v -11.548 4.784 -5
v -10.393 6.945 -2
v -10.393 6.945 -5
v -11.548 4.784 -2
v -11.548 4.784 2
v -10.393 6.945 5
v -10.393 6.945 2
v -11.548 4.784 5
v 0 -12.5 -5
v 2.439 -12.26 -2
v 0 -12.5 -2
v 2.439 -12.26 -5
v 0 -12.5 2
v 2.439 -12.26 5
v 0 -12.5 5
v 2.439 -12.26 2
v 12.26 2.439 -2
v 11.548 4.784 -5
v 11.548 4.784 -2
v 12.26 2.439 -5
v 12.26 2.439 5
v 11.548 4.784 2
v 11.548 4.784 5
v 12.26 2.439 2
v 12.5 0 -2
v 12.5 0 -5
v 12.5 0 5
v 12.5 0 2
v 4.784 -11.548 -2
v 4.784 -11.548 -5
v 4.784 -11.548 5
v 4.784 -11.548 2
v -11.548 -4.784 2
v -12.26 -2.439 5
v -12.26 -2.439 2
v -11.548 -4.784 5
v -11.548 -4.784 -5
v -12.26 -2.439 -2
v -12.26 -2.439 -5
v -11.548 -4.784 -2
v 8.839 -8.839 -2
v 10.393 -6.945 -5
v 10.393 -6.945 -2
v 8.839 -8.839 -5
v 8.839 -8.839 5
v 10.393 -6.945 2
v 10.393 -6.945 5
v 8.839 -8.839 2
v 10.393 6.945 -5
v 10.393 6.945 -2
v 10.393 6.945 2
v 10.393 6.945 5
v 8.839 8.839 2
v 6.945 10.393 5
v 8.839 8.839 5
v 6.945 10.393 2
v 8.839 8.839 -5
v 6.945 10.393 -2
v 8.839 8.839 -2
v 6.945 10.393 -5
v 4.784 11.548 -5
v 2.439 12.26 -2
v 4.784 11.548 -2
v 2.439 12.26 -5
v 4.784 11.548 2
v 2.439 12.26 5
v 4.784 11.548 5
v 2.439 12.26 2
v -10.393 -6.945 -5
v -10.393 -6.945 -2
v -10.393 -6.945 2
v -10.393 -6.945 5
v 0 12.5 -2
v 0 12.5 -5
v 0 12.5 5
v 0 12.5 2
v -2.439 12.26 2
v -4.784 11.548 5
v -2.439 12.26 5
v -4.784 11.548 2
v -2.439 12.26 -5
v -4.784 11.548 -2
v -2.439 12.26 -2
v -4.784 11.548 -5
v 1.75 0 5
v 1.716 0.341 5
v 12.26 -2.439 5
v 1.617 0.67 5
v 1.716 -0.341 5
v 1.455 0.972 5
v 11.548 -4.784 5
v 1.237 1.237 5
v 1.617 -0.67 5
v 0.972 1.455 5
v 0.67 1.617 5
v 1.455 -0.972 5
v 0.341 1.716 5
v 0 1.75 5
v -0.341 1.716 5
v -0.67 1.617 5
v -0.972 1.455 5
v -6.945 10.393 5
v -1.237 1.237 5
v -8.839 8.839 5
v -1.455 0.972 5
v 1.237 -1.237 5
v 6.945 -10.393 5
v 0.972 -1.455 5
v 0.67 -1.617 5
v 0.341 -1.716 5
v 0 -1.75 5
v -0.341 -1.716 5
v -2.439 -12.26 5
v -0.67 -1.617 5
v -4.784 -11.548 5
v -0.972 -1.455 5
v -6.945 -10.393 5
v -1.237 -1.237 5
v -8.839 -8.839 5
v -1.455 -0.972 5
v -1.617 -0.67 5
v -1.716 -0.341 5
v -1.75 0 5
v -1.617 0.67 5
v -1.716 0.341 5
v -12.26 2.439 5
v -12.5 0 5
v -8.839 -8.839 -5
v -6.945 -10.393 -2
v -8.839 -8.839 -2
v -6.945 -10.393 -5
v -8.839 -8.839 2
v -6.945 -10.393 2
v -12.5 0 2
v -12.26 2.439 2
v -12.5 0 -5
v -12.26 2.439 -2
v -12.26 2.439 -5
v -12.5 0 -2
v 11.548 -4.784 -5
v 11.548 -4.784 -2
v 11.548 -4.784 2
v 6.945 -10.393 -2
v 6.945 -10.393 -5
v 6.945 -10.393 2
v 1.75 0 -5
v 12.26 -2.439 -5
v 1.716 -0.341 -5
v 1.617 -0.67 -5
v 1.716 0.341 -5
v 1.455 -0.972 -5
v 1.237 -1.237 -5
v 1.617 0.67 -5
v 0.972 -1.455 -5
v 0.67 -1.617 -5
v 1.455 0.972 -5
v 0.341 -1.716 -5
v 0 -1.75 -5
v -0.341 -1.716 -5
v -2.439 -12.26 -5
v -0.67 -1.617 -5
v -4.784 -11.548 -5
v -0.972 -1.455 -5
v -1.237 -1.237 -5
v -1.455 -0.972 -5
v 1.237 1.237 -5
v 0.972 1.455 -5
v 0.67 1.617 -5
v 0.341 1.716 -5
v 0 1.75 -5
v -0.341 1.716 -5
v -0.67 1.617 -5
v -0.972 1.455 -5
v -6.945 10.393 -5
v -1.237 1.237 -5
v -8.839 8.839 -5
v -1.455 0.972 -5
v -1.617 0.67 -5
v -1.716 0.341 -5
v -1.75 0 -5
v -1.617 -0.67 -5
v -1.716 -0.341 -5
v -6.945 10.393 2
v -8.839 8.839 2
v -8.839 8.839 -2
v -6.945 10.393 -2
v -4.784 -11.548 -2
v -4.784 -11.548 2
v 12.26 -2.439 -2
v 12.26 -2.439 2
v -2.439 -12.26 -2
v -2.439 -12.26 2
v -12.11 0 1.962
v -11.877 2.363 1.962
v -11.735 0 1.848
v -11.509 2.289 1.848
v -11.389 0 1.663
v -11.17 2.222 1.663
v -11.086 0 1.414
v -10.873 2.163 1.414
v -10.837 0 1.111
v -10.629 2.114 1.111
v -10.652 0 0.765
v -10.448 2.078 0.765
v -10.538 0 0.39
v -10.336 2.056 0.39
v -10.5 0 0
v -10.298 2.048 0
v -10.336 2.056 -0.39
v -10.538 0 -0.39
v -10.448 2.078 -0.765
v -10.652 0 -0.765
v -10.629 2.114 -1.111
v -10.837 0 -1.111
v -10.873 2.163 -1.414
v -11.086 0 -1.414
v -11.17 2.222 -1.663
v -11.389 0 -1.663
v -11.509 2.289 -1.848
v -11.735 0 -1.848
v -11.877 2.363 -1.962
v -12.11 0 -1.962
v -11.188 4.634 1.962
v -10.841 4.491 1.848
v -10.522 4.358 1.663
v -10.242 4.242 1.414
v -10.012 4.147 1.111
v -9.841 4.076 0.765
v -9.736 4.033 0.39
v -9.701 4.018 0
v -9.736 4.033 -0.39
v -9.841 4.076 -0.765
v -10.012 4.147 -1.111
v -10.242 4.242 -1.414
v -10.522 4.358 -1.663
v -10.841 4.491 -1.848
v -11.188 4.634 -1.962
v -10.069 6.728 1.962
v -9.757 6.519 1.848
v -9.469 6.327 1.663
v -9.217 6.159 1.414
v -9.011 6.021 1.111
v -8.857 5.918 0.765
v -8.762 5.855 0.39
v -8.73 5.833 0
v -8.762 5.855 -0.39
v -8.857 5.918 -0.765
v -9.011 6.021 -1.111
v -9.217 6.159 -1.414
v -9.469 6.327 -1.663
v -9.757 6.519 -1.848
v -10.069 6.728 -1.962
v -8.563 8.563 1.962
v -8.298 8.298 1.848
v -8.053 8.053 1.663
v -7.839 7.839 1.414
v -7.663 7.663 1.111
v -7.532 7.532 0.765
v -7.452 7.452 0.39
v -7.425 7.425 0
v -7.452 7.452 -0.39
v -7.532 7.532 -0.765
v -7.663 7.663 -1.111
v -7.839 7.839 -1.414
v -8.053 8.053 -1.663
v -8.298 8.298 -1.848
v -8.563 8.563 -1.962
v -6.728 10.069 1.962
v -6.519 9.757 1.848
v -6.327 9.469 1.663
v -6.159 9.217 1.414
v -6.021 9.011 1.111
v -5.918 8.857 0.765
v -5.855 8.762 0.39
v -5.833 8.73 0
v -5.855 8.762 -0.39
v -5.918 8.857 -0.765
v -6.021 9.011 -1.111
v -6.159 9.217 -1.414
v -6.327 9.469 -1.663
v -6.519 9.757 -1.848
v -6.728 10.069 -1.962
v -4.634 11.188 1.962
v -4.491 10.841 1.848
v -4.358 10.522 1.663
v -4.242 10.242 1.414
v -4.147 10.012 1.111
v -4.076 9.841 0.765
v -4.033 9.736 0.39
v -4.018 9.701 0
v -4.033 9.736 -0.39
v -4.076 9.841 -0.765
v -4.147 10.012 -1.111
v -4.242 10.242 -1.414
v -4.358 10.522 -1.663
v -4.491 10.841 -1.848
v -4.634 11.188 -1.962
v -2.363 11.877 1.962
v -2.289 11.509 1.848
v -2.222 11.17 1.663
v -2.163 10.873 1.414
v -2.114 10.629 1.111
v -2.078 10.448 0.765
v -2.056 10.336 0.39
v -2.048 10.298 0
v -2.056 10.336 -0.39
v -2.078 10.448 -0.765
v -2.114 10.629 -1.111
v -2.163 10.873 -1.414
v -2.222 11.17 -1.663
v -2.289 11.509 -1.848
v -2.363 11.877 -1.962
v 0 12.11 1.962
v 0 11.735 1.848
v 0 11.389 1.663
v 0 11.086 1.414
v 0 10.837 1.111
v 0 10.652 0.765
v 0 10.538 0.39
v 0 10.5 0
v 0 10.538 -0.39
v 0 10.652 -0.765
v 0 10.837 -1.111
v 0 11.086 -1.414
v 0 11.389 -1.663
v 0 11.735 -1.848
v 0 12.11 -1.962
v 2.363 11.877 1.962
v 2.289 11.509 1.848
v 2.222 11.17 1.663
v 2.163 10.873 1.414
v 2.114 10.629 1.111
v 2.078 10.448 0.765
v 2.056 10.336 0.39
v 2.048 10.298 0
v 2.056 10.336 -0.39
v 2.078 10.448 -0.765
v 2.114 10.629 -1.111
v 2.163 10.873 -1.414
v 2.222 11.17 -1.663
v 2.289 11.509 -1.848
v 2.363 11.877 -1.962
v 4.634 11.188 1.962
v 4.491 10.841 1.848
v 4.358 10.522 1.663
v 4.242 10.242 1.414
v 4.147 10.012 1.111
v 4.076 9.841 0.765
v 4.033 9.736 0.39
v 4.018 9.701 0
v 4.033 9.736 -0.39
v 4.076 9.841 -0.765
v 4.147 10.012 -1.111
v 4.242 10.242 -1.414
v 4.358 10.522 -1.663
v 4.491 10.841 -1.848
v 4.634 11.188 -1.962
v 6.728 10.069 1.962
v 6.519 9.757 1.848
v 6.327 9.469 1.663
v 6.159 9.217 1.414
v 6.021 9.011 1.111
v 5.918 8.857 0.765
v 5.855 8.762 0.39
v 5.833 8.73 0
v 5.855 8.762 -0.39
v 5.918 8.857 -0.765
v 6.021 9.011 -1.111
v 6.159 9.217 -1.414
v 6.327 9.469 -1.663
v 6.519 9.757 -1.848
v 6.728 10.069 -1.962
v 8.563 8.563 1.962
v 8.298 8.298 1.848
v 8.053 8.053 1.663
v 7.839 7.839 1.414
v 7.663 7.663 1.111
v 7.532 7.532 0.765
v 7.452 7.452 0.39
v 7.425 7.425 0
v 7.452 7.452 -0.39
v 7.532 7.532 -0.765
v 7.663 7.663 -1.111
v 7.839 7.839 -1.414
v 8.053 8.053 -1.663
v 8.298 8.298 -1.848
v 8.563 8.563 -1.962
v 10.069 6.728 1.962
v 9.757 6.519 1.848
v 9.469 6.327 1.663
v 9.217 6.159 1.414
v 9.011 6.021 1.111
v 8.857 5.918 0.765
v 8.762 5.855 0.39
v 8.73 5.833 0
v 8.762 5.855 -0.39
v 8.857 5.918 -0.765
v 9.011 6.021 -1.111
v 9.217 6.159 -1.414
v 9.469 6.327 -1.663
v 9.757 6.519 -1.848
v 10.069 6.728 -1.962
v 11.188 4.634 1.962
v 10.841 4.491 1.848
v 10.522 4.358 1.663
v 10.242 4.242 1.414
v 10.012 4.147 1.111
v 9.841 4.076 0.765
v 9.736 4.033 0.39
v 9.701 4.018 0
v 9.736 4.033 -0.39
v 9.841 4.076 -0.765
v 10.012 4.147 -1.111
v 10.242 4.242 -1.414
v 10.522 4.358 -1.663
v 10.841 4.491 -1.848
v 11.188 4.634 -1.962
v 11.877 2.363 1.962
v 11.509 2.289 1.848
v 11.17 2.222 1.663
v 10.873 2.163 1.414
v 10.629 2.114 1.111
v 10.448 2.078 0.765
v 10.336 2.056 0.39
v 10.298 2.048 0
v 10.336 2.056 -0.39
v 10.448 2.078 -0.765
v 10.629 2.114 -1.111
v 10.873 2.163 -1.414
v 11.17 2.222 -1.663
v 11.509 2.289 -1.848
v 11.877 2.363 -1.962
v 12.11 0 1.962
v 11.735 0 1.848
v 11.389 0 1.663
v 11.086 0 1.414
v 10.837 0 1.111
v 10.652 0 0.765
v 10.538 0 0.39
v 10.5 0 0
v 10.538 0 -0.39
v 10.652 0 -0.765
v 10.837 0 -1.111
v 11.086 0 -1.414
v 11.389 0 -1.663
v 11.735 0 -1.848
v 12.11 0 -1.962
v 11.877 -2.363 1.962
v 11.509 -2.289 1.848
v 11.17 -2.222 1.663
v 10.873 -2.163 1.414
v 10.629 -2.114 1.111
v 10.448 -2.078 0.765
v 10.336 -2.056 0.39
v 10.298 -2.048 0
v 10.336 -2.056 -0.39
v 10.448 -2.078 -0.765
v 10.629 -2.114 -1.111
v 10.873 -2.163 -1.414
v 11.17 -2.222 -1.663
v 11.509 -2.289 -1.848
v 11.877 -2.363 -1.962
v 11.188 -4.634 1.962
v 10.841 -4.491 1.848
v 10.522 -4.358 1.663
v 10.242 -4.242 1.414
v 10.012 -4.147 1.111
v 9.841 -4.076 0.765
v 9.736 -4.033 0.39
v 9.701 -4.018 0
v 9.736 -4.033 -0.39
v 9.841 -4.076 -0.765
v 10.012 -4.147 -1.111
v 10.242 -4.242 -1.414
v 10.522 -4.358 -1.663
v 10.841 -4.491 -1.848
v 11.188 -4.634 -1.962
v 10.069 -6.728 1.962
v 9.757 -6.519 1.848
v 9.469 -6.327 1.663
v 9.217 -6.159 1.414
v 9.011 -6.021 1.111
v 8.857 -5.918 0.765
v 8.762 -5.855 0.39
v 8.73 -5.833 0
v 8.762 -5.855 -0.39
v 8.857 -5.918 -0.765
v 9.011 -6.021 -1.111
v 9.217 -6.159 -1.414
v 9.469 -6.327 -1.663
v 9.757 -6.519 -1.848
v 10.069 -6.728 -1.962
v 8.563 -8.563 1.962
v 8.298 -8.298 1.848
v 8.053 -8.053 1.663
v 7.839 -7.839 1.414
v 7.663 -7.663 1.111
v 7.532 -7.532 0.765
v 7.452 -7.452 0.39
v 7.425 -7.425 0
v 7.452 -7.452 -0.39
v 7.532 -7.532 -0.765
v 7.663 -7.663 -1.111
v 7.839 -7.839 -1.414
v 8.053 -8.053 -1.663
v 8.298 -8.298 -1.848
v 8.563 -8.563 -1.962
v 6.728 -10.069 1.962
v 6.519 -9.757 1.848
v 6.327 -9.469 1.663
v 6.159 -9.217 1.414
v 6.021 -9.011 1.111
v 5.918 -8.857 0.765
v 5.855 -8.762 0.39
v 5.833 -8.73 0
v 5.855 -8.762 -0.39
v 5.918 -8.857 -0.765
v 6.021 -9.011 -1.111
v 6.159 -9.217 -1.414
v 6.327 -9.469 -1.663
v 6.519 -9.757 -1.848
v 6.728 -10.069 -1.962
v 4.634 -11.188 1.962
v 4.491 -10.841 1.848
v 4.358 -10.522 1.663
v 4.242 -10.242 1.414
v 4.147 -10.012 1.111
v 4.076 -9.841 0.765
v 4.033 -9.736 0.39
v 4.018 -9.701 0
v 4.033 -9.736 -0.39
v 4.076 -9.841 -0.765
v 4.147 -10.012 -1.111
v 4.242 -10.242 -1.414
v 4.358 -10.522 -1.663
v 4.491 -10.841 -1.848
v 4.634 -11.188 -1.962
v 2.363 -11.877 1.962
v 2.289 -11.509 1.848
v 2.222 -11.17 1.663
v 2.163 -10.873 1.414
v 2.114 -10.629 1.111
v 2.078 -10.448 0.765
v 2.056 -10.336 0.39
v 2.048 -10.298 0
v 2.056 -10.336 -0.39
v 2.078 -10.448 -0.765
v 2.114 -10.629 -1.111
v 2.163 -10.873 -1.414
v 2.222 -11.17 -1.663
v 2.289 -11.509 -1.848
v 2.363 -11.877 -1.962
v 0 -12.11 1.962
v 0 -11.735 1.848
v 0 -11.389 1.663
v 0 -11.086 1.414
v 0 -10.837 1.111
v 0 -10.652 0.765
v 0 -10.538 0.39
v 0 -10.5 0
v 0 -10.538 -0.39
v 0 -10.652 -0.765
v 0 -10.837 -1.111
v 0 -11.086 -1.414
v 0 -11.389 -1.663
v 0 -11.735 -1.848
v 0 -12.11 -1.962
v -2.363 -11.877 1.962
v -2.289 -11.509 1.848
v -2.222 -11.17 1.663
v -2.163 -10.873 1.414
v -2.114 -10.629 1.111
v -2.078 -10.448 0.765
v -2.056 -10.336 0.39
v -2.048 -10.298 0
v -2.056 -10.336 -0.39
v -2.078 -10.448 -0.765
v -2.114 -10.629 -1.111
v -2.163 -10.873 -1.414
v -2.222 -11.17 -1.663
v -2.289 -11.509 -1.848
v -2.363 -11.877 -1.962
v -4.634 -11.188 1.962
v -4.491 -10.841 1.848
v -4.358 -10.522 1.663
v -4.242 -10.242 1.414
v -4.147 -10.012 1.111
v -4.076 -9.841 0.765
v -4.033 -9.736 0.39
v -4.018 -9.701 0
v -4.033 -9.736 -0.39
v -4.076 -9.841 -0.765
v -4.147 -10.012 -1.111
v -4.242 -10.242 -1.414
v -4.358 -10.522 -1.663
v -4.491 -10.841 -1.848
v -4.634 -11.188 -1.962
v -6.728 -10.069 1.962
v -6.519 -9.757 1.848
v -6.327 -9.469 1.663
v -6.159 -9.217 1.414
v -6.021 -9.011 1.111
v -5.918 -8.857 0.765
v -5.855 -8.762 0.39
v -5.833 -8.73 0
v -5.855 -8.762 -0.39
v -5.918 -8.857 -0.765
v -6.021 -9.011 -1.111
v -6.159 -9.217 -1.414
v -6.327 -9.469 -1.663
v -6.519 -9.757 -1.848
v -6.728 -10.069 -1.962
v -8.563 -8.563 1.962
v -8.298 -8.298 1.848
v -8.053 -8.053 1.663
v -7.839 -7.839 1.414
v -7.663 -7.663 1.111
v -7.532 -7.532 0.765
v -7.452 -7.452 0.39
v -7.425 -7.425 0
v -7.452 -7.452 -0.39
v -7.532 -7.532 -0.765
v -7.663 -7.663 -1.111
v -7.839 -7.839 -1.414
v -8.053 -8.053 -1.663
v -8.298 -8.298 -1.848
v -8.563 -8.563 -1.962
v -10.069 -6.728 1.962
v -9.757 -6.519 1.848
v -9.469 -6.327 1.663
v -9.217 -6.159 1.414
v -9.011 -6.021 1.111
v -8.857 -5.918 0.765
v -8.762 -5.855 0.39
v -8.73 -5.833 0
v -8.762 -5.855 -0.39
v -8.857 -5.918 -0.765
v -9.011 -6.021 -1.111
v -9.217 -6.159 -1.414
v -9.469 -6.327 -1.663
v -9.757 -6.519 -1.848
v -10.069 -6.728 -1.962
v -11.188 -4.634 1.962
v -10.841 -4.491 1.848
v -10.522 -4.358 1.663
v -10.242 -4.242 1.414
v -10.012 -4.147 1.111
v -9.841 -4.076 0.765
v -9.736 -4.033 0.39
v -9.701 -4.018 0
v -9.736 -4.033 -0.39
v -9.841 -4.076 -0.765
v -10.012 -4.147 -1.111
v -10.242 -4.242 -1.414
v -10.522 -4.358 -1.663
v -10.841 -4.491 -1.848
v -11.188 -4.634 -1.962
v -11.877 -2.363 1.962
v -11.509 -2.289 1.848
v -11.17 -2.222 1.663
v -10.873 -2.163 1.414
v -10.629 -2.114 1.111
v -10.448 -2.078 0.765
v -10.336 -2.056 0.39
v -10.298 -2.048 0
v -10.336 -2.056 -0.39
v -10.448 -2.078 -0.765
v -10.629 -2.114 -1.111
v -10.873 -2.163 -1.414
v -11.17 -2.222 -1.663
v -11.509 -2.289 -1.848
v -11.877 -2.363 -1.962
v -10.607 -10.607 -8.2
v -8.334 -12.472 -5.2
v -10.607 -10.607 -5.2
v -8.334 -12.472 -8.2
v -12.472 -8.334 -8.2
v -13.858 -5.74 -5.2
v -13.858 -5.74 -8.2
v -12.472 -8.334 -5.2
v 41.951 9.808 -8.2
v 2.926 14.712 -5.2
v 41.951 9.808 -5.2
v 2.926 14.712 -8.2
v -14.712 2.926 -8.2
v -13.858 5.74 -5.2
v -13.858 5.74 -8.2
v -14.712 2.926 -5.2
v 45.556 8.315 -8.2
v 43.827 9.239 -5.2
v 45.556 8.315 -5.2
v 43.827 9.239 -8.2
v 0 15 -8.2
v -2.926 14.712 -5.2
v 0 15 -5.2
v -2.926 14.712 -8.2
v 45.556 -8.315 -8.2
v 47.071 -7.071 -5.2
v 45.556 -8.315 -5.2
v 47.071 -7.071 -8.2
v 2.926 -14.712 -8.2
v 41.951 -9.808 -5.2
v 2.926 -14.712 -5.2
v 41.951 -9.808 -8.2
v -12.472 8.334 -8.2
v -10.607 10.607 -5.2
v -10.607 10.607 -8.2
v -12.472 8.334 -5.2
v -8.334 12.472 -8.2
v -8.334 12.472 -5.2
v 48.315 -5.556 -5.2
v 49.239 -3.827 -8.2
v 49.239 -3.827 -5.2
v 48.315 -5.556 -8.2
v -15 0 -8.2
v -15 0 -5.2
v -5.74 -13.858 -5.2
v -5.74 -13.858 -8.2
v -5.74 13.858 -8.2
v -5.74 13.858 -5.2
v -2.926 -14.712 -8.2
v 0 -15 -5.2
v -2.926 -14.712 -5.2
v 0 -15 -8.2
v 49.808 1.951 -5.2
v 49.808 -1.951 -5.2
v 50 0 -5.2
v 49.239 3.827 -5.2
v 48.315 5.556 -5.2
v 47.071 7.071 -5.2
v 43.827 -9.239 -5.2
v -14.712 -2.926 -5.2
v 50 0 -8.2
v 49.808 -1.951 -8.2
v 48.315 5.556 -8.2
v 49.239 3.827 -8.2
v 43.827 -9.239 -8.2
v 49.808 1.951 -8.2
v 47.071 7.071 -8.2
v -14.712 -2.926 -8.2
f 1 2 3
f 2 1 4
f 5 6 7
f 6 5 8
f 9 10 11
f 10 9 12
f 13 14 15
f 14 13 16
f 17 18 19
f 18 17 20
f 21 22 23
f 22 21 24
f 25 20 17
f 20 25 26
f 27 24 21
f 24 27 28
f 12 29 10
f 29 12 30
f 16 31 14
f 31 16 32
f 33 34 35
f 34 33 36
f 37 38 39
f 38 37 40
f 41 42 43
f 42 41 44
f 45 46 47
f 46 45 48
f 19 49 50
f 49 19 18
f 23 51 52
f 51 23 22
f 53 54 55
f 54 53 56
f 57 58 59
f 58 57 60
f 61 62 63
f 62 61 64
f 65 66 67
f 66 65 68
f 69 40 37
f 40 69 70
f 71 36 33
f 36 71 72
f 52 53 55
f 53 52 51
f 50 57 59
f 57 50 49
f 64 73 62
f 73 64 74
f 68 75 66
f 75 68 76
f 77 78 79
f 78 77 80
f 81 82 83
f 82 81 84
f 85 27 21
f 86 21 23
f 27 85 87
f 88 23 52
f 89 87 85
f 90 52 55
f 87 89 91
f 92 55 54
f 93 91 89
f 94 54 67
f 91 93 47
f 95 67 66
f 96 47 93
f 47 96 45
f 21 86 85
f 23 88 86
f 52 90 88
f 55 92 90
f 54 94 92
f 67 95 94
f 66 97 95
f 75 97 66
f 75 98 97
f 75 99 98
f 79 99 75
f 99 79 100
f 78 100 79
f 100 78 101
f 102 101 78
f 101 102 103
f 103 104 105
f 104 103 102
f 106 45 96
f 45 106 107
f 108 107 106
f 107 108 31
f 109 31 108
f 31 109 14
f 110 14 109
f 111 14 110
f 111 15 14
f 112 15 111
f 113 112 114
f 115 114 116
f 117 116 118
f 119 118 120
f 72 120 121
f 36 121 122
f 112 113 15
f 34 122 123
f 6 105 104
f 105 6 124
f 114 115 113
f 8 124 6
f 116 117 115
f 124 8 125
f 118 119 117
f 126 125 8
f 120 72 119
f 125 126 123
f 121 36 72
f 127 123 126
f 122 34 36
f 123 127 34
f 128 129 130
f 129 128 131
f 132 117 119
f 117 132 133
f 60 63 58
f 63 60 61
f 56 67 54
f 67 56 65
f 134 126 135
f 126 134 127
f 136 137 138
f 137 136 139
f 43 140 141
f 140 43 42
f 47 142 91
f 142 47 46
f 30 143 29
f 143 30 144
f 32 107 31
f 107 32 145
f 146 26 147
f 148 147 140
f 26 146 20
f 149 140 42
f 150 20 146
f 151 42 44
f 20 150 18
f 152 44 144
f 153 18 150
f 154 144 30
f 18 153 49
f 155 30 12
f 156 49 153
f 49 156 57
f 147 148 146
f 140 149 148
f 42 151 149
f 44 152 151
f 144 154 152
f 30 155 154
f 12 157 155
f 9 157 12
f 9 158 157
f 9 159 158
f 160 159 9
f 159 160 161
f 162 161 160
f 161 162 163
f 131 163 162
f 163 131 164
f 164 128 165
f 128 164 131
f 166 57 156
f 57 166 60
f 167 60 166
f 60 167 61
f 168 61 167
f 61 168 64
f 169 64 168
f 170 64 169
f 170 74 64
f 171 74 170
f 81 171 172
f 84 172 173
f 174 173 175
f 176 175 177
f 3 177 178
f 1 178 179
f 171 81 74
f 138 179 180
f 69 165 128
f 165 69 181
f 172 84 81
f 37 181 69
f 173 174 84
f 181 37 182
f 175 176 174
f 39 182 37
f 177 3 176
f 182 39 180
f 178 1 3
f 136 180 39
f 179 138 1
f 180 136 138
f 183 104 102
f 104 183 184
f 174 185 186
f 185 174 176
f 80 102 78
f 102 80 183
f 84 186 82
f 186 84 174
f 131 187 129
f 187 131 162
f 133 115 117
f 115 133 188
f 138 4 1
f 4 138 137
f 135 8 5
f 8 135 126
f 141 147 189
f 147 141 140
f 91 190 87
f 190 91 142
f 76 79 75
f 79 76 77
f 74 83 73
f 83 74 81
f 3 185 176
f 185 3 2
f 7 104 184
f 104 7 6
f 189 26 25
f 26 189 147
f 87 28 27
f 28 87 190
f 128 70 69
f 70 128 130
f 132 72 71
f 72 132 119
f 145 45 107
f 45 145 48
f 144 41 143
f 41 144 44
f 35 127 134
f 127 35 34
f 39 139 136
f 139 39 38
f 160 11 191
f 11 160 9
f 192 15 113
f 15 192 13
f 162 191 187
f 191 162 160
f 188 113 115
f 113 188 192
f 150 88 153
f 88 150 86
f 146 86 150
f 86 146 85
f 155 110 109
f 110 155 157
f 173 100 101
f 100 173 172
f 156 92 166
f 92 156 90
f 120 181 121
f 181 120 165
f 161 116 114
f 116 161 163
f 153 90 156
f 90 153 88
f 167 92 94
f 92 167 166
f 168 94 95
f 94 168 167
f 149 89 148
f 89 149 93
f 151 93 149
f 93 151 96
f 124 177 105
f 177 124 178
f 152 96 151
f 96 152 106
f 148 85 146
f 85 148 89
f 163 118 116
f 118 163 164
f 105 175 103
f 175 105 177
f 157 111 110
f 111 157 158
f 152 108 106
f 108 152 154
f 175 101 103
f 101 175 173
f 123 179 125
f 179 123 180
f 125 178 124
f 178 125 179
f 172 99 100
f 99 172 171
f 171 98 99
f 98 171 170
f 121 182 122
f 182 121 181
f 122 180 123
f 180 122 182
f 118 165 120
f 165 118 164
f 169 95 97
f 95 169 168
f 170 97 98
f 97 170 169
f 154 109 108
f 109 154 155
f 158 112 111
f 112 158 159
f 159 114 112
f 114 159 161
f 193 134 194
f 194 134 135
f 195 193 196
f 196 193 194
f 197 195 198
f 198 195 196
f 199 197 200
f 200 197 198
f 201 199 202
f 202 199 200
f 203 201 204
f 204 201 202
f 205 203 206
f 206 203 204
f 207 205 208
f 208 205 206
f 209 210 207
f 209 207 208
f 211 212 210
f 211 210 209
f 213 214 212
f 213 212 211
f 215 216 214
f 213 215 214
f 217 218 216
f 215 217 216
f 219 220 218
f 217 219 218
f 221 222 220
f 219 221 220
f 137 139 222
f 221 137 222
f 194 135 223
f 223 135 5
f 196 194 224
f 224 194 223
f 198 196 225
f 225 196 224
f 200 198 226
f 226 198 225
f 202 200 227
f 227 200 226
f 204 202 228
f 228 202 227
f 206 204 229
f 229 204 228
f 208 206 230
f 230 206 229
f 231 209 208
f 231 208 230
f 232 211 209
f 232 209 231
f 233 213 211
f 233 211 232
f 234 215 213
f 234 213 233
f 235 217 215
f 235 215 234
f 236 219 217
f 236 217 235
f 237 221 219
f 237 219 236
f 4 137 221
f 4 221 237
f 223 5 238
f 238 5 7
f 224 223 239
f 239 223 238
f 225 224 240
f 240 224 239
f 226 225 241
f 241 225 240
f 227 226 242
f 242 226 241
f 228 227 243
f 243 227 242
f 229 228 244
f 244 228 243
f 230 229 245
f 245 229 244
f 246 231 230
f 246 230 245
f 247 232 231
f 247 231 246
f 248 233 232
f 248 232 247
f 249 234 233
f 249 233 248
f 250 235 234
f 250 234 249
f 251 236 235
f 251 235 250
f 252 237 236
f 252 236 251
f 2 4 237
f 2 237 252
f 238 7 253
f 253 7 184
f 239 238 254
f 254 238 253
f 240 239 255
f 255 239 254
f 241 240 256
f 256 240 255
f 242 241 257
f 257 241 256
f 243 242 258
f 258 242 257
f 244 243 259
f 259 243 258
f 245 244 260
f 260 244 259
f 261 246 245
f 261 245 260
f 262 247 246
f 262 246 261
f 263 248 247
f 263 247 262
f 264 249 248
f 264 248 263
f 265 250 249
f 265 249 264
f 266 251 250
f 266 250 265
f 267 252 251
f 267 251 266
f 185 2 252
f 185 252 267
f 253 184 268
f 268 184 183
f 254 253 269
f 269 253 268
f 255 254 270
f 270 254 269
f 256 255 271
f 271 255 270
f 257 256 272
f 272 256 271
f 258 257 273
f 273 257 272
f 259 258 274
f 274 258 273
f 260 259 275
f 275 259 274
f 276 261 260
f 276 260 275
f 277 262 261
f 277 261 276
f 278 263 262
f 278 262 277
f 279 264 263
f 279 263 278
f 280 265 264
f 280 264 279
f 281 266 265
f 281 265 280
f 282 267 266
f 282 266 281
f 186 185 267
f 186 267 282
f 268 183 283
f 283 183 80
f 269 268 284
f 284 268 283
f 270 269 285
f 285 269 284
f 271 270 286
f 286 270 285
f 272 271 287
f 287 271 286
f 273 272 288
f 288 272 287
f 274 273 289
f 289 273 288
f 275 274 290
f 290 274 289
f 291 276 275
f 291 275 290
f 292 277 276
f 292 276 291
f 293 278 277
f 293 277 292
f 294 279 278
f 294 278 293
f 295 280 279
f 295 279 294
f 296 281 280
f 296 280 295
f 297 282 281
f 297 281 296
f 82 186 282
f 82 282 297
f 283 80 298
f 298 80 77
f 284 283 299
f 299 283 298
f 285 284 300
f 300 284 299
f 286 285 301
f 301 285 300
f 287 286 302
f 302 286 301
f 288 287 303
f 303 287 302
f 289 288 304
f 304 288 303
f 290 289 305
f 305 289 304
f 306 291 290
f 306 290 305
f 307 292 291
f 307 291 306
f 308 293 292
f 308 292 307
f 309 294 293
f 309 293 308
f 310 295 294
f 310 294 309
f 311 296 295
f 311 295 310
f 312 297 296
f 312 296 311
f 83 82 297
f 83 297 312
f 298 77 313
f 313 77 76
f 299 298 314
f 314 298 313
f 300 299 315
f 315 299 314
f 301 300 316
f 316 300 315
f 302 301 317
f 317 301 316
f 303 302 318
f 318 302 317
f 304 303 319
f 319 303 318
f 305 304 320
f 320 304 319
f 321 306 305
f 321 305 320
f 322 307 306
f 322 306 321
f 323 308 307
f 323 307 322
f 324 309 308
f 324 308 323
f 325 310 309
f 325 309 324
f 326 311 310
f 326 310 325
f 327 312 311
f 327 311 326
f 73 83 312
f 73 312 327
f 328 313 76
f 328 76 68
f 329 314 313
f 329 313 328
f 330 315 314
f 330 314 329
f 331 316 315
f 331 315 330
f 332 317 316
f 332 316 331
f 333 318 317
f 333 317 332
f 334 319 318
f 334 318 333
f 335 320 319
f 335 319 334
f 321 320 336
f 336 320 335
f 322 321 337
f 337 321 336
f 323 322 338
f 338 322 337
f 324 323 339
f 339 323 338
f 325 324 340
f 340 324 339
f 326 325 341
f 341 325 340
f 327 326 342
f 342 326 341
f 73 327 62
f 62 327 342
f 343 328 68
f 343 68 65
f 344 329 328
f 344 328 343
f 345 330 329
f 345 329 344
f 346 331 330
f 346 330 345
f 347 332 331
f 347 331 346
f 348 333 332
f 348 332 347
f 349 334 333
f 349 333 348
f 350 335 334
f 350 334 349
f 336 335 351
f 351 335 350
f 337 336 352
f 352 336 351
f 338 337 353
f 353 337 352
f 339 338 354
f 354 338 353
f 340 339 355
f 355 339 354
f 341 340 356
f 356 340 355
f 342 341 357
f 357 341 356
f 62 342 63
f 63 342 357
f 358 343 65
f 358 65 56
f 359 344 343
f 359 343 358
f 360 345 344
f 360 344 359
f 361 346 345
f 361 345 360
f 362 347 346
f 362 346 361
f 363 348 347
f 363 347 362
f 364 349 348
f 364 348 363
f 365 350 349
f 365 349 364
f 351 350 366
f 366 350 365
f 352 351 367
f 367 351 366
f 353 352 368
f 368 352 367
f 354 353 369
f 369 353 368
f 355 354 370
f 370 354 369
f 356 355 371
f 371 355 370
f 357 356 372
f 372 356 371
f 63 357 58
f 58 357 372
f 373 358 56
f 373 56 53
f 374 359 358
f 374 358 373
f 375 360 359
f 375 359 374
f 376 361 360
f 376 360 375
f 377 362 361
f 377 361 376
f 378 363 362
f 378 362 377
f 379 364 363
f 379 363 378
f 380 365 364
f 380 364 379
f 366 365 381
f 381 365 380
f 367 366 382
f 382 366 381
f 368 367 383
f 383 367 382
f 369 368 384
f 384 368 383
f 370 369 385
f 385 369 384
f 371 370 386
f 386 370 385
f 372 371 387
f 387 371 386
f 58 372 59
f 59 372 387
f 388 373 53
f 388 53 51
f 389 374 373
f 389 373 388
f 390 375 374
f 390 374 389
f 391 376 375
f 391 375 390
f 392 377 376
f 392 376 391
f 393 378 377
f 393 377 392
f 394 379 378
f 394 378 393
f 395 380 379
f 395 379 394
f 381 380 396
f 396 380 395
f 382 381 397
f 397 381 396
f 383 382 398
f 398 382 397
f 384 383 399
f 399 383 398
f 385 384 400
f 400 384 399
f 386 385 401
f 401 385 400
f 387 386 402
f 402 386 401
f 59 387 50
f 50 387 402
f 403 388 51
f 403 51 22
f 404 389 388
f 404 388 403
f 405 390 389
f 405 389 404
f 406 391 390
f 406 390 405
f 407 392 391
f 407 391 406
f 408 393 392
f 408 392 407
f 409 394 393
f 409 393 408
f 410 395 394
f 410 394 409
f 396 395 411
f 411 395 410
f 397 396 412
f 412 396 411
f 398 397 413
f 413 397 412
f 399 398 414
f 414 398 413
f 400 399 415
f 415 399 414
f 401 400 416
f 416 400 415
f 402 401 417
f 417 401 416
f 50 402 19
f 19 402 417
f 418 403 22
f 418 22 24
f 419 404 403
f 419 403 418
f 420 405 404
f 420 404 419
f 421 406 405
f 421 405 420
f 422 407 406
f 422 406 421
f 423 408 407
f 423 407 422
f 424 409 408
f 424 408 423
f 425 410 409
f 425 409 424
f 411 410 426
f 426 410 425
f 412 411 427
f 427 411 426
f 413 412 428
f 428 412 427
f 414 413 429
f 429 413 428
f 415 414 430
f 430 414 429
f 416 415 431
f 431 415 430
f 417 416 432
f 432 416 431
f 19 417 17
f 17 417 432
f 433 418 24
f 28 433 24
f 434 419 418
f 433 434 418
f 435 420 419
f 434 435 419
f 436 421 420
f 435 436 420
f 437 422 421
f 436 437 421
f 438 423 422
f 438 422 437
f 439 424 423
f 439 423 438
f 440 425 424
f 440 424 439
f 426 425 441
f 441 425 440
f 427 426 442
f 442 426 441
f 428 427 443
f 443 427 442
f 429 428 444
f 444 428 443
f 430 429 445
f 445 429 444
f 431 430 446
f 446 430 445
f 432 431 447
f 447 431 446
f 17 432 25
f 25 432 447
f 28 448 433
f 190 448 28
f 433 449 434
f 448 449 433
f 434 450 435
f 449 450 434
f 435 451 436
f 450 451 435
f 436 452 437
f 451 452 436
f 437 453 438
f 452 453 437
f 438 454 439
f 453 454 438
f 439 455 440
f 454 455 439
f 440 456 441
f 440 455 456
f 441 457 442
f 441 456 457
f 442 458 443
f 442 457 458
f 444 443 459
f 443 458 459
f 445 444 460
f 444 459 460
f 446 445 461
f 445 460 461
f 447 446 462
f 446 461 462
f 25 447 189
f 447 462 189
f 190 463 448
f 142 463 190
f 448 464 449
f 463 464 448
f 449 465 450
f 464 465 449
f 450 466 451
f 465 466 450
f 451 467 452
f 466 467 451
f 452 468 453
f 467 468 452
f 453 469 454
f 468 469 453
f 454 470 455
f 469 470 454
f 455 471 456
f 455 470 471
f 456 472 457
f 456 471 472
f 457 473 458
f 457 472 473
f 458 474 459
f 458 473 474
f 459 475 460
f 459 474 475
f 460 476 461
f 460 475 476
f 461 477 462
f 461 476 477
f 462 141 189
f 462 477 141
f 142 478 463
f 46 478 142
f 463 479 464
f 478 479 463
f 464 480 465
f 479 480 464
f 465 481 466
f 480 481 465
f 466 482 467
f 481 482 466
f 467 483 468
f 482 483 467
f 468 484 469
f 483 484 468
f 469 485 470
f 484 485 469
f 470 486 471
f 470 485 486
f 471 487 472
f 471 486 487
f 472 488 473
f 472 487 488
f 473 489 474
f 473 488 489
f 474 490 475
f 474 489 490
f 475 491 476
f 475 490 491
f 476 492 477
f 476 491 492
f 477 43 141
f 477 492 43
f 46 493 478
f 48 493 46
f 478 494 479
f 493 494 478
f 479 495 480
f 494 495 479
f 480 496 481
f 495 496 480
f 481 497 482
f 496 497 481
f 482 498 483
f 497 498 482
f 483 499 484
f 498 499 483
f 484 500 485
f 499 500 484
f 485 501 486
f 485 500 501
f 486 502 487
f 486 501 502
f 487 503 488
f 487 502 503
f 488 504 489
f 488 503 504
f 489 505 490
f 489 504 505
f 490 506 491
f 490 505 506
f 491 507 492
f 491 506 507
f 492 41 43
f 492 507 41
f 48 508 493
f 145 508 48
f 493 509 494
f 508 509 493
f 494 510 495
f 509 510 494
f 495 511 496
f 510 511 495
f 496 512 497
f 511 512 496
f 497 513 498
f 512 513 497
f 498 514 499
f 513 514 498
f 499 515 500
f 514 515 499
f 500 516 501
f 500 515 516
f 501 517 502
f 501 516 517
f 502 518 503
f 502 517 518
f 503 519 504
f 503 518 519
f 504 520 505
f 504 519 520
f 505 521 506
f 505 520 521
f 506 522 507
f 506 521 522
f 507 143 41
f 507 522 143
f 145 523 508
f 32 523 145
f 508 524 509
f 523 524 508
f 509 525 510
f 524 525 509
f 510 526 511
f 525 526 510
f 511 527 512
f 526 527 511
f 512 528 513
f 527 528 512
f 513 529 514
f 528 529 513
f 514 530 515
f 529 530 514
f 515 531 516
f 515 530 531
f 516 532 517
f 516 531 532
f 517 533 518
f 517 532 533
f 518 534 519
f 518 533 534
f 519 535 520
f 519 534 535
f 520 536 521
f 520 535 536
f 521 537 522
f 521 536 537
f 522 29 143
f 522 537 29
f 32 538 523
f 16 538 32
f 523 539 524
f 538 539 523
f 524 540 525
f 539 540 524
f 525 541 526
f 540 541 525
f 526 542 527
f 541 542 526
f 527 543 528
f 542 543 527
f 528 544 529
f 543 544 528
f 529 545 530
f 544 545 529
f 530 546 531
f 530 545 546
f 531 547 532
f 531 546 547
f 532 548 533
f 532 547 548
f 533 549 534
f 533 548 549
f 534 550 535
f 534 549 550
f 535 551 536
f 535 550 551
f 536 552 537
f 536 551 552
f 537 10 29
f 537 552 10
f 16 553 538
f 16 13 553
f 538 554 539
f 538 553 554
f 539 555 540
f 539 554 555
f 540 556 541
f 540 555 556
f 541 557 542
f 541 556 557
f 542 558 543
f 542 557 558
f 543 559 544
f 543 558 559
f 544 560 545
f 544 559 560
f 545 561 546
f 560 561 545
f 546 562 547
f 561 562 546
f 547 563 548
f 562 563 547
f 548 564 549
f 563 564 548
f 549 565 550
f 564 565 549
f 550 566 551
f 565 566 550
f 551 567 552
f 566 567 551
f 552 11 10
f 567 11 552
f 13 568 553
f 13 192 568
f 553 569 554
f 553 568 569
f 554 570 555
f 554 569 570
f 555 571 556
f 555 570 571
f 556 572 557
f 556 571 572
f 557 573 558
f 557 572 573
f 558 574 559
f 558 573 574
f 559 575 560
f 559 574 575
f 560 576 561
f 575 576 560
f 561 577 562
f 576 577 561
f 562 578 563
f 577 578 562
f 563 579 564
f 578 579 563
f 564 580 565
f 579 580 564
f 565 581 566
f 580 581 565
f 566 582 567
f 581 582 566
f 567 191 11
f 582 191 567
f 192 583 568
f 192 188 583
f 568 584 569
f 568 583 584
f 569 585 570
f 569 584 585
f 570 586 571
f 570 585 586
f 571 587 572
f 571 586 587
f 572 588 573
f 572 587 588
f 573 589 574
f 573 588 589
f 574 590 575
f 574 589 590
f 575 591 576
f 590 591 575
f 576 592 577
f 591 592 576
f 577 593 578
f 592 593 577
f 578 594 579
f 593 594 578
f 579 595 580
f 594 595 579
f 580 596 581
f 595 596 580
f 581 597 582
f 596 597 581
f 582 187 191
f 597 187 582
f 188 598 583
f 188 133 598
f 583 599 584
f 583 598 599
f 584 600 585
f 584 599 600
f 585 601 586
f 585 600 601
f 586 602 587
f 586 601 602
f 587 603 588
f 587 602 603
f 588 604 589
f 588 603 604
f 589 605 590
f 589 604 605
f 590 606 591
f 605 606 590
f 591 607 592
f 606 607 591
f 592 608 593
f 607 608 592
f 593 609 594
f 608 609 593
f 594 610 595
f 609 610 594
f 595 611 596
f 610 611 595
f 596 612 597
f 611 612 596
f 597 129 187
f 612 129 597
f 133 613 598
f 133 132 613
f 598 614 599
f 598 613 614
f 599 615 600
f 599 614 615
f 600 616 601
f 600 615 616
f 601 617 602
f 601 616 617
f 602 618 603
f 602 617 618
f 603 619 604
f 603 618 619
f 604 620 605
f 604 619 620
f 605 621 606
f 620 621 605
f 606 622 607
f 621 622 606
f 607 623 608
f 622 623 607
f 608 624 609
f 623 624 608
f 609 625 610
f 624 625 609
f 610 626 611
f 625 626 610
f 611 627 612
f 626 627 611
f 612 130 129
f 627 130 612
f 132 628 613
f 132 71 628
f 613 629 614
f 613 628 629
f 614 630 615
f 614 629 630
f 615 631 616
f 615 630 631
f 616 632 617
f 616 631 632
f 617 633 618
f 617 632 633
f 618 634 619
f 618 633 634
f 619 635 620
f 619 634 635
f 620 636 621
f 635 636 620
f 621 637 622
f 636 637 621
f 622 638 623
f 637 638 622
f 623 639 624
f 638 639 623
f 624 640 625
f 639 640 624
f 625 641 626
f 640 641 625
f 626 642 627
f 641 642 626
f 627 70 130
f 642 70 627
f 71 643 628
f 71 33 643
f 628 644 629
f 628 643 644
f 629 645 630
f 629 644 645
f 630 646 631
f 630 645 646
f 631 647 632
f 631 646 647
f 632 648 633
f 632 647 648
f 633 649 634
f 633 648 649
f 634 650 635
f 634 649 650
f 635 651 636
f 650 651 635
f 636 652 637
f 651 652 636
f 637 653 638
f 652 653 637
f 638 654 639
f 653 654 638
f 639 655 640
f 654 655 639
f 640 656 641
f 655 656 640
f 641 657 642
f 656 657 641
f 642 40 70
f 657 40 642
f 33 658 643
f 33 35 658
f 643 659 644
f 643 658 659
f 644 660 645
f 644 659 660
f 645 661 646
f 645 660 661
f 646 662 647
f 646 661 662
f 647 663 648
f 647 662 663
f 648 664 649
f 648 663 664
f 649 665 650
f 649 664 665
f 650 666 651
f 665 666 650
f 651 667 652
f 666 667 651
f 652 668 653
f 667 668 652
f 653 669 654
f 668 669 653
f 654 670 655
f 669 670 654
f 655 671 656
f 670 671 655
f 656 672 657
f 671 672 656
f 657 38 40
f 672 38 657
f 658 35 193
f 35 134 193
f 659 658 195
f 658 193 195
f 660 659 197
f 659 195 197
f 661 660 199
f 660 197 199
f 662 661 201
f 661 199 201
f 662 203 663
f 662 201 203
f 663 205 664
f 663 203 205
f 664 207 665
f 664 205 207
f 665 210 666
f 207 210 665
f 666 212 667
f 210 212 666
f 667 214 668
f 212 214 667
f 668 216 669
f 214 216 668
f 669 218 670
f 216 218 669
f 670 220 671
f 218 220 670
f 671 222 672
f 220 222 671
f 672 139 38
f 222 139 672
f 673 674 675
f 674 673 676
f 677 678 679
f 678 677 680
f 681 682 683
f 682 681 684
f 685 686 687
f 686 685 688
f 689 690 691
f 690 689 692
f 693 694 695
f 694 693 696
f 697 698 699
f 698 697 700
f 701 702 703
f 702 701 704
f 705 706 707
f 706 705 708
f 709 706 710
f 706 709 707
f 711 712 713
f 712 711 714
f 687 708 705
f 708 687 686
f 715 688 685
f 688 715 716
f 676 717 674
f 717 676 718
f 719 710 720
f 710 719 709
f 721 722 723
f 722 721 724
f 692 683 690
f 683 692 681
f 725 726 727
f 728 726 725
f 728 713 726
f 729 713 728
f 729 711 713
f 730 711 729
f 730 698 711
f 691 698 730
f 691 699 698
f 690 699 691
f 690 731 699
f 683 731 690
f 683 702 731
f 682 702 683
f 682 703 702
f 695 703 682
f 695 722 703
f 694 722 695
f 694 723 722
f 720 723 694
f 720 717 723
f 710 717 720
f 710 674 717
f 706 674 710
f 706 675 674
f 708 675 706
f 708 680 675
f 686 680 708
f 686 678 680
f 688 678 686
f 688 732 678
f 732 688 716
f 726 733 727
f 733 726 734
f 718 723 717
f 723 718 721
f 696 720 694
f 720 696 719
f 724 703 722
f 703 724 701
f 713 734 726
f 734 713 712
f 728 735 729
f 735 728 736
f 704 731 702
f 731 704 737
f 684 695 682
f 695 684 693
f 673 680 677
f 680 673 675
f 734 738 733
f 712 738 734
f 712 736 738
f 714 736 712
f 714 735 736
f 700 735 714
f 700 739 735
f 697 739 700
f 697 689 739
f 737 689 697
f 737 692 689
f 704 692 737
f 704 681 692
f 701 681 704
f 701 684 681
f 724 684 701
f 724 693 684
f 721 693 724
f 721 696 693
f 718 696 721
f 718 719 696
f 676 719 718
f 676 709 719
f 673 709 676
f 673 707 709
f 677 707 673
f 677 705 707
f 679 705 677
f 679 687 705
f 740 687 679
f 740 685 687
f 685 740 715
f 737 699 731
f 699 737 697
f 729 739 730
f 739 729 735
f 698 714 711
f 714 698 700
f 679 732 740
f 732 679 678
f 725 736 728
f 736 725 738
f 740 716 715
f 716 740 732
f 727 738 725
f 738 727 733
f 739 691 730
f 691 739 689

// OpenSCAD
$fn=32;

// definitionen
dm_rolle = 25;
t_rolle = 10;
spiel = 0.2;
dm_nut = 4;
d1_seite = 30;
d2_seite = 20;
h_seite = 40;
t_seite = 3;
//hilfsmodule


//hauptmodule
module rolle(){
  difference(){
    difference(){
      union(){
        cylinder(d=dm_rolle,h=t_rolle,center=true);
      }
      cylinder(d=3.5,h=10.1,center=true);
    }
    rotate_extrude(convexity=10)
    translate([dm_rolle/2,0,0])circle(d=dm_nut);
  }
}

module seitenteil(){
  hull(){
    cylinder(d=d1_seite,h=t_seite,center=true);
    translate([h_seite,0,0]) cylinder(d=d2_seite, h=t_seite, center=true);
  }
}




rolle();
translate([0,0,(-t_rolle/2-t_seite/2)-spiel]) seitenteil();
